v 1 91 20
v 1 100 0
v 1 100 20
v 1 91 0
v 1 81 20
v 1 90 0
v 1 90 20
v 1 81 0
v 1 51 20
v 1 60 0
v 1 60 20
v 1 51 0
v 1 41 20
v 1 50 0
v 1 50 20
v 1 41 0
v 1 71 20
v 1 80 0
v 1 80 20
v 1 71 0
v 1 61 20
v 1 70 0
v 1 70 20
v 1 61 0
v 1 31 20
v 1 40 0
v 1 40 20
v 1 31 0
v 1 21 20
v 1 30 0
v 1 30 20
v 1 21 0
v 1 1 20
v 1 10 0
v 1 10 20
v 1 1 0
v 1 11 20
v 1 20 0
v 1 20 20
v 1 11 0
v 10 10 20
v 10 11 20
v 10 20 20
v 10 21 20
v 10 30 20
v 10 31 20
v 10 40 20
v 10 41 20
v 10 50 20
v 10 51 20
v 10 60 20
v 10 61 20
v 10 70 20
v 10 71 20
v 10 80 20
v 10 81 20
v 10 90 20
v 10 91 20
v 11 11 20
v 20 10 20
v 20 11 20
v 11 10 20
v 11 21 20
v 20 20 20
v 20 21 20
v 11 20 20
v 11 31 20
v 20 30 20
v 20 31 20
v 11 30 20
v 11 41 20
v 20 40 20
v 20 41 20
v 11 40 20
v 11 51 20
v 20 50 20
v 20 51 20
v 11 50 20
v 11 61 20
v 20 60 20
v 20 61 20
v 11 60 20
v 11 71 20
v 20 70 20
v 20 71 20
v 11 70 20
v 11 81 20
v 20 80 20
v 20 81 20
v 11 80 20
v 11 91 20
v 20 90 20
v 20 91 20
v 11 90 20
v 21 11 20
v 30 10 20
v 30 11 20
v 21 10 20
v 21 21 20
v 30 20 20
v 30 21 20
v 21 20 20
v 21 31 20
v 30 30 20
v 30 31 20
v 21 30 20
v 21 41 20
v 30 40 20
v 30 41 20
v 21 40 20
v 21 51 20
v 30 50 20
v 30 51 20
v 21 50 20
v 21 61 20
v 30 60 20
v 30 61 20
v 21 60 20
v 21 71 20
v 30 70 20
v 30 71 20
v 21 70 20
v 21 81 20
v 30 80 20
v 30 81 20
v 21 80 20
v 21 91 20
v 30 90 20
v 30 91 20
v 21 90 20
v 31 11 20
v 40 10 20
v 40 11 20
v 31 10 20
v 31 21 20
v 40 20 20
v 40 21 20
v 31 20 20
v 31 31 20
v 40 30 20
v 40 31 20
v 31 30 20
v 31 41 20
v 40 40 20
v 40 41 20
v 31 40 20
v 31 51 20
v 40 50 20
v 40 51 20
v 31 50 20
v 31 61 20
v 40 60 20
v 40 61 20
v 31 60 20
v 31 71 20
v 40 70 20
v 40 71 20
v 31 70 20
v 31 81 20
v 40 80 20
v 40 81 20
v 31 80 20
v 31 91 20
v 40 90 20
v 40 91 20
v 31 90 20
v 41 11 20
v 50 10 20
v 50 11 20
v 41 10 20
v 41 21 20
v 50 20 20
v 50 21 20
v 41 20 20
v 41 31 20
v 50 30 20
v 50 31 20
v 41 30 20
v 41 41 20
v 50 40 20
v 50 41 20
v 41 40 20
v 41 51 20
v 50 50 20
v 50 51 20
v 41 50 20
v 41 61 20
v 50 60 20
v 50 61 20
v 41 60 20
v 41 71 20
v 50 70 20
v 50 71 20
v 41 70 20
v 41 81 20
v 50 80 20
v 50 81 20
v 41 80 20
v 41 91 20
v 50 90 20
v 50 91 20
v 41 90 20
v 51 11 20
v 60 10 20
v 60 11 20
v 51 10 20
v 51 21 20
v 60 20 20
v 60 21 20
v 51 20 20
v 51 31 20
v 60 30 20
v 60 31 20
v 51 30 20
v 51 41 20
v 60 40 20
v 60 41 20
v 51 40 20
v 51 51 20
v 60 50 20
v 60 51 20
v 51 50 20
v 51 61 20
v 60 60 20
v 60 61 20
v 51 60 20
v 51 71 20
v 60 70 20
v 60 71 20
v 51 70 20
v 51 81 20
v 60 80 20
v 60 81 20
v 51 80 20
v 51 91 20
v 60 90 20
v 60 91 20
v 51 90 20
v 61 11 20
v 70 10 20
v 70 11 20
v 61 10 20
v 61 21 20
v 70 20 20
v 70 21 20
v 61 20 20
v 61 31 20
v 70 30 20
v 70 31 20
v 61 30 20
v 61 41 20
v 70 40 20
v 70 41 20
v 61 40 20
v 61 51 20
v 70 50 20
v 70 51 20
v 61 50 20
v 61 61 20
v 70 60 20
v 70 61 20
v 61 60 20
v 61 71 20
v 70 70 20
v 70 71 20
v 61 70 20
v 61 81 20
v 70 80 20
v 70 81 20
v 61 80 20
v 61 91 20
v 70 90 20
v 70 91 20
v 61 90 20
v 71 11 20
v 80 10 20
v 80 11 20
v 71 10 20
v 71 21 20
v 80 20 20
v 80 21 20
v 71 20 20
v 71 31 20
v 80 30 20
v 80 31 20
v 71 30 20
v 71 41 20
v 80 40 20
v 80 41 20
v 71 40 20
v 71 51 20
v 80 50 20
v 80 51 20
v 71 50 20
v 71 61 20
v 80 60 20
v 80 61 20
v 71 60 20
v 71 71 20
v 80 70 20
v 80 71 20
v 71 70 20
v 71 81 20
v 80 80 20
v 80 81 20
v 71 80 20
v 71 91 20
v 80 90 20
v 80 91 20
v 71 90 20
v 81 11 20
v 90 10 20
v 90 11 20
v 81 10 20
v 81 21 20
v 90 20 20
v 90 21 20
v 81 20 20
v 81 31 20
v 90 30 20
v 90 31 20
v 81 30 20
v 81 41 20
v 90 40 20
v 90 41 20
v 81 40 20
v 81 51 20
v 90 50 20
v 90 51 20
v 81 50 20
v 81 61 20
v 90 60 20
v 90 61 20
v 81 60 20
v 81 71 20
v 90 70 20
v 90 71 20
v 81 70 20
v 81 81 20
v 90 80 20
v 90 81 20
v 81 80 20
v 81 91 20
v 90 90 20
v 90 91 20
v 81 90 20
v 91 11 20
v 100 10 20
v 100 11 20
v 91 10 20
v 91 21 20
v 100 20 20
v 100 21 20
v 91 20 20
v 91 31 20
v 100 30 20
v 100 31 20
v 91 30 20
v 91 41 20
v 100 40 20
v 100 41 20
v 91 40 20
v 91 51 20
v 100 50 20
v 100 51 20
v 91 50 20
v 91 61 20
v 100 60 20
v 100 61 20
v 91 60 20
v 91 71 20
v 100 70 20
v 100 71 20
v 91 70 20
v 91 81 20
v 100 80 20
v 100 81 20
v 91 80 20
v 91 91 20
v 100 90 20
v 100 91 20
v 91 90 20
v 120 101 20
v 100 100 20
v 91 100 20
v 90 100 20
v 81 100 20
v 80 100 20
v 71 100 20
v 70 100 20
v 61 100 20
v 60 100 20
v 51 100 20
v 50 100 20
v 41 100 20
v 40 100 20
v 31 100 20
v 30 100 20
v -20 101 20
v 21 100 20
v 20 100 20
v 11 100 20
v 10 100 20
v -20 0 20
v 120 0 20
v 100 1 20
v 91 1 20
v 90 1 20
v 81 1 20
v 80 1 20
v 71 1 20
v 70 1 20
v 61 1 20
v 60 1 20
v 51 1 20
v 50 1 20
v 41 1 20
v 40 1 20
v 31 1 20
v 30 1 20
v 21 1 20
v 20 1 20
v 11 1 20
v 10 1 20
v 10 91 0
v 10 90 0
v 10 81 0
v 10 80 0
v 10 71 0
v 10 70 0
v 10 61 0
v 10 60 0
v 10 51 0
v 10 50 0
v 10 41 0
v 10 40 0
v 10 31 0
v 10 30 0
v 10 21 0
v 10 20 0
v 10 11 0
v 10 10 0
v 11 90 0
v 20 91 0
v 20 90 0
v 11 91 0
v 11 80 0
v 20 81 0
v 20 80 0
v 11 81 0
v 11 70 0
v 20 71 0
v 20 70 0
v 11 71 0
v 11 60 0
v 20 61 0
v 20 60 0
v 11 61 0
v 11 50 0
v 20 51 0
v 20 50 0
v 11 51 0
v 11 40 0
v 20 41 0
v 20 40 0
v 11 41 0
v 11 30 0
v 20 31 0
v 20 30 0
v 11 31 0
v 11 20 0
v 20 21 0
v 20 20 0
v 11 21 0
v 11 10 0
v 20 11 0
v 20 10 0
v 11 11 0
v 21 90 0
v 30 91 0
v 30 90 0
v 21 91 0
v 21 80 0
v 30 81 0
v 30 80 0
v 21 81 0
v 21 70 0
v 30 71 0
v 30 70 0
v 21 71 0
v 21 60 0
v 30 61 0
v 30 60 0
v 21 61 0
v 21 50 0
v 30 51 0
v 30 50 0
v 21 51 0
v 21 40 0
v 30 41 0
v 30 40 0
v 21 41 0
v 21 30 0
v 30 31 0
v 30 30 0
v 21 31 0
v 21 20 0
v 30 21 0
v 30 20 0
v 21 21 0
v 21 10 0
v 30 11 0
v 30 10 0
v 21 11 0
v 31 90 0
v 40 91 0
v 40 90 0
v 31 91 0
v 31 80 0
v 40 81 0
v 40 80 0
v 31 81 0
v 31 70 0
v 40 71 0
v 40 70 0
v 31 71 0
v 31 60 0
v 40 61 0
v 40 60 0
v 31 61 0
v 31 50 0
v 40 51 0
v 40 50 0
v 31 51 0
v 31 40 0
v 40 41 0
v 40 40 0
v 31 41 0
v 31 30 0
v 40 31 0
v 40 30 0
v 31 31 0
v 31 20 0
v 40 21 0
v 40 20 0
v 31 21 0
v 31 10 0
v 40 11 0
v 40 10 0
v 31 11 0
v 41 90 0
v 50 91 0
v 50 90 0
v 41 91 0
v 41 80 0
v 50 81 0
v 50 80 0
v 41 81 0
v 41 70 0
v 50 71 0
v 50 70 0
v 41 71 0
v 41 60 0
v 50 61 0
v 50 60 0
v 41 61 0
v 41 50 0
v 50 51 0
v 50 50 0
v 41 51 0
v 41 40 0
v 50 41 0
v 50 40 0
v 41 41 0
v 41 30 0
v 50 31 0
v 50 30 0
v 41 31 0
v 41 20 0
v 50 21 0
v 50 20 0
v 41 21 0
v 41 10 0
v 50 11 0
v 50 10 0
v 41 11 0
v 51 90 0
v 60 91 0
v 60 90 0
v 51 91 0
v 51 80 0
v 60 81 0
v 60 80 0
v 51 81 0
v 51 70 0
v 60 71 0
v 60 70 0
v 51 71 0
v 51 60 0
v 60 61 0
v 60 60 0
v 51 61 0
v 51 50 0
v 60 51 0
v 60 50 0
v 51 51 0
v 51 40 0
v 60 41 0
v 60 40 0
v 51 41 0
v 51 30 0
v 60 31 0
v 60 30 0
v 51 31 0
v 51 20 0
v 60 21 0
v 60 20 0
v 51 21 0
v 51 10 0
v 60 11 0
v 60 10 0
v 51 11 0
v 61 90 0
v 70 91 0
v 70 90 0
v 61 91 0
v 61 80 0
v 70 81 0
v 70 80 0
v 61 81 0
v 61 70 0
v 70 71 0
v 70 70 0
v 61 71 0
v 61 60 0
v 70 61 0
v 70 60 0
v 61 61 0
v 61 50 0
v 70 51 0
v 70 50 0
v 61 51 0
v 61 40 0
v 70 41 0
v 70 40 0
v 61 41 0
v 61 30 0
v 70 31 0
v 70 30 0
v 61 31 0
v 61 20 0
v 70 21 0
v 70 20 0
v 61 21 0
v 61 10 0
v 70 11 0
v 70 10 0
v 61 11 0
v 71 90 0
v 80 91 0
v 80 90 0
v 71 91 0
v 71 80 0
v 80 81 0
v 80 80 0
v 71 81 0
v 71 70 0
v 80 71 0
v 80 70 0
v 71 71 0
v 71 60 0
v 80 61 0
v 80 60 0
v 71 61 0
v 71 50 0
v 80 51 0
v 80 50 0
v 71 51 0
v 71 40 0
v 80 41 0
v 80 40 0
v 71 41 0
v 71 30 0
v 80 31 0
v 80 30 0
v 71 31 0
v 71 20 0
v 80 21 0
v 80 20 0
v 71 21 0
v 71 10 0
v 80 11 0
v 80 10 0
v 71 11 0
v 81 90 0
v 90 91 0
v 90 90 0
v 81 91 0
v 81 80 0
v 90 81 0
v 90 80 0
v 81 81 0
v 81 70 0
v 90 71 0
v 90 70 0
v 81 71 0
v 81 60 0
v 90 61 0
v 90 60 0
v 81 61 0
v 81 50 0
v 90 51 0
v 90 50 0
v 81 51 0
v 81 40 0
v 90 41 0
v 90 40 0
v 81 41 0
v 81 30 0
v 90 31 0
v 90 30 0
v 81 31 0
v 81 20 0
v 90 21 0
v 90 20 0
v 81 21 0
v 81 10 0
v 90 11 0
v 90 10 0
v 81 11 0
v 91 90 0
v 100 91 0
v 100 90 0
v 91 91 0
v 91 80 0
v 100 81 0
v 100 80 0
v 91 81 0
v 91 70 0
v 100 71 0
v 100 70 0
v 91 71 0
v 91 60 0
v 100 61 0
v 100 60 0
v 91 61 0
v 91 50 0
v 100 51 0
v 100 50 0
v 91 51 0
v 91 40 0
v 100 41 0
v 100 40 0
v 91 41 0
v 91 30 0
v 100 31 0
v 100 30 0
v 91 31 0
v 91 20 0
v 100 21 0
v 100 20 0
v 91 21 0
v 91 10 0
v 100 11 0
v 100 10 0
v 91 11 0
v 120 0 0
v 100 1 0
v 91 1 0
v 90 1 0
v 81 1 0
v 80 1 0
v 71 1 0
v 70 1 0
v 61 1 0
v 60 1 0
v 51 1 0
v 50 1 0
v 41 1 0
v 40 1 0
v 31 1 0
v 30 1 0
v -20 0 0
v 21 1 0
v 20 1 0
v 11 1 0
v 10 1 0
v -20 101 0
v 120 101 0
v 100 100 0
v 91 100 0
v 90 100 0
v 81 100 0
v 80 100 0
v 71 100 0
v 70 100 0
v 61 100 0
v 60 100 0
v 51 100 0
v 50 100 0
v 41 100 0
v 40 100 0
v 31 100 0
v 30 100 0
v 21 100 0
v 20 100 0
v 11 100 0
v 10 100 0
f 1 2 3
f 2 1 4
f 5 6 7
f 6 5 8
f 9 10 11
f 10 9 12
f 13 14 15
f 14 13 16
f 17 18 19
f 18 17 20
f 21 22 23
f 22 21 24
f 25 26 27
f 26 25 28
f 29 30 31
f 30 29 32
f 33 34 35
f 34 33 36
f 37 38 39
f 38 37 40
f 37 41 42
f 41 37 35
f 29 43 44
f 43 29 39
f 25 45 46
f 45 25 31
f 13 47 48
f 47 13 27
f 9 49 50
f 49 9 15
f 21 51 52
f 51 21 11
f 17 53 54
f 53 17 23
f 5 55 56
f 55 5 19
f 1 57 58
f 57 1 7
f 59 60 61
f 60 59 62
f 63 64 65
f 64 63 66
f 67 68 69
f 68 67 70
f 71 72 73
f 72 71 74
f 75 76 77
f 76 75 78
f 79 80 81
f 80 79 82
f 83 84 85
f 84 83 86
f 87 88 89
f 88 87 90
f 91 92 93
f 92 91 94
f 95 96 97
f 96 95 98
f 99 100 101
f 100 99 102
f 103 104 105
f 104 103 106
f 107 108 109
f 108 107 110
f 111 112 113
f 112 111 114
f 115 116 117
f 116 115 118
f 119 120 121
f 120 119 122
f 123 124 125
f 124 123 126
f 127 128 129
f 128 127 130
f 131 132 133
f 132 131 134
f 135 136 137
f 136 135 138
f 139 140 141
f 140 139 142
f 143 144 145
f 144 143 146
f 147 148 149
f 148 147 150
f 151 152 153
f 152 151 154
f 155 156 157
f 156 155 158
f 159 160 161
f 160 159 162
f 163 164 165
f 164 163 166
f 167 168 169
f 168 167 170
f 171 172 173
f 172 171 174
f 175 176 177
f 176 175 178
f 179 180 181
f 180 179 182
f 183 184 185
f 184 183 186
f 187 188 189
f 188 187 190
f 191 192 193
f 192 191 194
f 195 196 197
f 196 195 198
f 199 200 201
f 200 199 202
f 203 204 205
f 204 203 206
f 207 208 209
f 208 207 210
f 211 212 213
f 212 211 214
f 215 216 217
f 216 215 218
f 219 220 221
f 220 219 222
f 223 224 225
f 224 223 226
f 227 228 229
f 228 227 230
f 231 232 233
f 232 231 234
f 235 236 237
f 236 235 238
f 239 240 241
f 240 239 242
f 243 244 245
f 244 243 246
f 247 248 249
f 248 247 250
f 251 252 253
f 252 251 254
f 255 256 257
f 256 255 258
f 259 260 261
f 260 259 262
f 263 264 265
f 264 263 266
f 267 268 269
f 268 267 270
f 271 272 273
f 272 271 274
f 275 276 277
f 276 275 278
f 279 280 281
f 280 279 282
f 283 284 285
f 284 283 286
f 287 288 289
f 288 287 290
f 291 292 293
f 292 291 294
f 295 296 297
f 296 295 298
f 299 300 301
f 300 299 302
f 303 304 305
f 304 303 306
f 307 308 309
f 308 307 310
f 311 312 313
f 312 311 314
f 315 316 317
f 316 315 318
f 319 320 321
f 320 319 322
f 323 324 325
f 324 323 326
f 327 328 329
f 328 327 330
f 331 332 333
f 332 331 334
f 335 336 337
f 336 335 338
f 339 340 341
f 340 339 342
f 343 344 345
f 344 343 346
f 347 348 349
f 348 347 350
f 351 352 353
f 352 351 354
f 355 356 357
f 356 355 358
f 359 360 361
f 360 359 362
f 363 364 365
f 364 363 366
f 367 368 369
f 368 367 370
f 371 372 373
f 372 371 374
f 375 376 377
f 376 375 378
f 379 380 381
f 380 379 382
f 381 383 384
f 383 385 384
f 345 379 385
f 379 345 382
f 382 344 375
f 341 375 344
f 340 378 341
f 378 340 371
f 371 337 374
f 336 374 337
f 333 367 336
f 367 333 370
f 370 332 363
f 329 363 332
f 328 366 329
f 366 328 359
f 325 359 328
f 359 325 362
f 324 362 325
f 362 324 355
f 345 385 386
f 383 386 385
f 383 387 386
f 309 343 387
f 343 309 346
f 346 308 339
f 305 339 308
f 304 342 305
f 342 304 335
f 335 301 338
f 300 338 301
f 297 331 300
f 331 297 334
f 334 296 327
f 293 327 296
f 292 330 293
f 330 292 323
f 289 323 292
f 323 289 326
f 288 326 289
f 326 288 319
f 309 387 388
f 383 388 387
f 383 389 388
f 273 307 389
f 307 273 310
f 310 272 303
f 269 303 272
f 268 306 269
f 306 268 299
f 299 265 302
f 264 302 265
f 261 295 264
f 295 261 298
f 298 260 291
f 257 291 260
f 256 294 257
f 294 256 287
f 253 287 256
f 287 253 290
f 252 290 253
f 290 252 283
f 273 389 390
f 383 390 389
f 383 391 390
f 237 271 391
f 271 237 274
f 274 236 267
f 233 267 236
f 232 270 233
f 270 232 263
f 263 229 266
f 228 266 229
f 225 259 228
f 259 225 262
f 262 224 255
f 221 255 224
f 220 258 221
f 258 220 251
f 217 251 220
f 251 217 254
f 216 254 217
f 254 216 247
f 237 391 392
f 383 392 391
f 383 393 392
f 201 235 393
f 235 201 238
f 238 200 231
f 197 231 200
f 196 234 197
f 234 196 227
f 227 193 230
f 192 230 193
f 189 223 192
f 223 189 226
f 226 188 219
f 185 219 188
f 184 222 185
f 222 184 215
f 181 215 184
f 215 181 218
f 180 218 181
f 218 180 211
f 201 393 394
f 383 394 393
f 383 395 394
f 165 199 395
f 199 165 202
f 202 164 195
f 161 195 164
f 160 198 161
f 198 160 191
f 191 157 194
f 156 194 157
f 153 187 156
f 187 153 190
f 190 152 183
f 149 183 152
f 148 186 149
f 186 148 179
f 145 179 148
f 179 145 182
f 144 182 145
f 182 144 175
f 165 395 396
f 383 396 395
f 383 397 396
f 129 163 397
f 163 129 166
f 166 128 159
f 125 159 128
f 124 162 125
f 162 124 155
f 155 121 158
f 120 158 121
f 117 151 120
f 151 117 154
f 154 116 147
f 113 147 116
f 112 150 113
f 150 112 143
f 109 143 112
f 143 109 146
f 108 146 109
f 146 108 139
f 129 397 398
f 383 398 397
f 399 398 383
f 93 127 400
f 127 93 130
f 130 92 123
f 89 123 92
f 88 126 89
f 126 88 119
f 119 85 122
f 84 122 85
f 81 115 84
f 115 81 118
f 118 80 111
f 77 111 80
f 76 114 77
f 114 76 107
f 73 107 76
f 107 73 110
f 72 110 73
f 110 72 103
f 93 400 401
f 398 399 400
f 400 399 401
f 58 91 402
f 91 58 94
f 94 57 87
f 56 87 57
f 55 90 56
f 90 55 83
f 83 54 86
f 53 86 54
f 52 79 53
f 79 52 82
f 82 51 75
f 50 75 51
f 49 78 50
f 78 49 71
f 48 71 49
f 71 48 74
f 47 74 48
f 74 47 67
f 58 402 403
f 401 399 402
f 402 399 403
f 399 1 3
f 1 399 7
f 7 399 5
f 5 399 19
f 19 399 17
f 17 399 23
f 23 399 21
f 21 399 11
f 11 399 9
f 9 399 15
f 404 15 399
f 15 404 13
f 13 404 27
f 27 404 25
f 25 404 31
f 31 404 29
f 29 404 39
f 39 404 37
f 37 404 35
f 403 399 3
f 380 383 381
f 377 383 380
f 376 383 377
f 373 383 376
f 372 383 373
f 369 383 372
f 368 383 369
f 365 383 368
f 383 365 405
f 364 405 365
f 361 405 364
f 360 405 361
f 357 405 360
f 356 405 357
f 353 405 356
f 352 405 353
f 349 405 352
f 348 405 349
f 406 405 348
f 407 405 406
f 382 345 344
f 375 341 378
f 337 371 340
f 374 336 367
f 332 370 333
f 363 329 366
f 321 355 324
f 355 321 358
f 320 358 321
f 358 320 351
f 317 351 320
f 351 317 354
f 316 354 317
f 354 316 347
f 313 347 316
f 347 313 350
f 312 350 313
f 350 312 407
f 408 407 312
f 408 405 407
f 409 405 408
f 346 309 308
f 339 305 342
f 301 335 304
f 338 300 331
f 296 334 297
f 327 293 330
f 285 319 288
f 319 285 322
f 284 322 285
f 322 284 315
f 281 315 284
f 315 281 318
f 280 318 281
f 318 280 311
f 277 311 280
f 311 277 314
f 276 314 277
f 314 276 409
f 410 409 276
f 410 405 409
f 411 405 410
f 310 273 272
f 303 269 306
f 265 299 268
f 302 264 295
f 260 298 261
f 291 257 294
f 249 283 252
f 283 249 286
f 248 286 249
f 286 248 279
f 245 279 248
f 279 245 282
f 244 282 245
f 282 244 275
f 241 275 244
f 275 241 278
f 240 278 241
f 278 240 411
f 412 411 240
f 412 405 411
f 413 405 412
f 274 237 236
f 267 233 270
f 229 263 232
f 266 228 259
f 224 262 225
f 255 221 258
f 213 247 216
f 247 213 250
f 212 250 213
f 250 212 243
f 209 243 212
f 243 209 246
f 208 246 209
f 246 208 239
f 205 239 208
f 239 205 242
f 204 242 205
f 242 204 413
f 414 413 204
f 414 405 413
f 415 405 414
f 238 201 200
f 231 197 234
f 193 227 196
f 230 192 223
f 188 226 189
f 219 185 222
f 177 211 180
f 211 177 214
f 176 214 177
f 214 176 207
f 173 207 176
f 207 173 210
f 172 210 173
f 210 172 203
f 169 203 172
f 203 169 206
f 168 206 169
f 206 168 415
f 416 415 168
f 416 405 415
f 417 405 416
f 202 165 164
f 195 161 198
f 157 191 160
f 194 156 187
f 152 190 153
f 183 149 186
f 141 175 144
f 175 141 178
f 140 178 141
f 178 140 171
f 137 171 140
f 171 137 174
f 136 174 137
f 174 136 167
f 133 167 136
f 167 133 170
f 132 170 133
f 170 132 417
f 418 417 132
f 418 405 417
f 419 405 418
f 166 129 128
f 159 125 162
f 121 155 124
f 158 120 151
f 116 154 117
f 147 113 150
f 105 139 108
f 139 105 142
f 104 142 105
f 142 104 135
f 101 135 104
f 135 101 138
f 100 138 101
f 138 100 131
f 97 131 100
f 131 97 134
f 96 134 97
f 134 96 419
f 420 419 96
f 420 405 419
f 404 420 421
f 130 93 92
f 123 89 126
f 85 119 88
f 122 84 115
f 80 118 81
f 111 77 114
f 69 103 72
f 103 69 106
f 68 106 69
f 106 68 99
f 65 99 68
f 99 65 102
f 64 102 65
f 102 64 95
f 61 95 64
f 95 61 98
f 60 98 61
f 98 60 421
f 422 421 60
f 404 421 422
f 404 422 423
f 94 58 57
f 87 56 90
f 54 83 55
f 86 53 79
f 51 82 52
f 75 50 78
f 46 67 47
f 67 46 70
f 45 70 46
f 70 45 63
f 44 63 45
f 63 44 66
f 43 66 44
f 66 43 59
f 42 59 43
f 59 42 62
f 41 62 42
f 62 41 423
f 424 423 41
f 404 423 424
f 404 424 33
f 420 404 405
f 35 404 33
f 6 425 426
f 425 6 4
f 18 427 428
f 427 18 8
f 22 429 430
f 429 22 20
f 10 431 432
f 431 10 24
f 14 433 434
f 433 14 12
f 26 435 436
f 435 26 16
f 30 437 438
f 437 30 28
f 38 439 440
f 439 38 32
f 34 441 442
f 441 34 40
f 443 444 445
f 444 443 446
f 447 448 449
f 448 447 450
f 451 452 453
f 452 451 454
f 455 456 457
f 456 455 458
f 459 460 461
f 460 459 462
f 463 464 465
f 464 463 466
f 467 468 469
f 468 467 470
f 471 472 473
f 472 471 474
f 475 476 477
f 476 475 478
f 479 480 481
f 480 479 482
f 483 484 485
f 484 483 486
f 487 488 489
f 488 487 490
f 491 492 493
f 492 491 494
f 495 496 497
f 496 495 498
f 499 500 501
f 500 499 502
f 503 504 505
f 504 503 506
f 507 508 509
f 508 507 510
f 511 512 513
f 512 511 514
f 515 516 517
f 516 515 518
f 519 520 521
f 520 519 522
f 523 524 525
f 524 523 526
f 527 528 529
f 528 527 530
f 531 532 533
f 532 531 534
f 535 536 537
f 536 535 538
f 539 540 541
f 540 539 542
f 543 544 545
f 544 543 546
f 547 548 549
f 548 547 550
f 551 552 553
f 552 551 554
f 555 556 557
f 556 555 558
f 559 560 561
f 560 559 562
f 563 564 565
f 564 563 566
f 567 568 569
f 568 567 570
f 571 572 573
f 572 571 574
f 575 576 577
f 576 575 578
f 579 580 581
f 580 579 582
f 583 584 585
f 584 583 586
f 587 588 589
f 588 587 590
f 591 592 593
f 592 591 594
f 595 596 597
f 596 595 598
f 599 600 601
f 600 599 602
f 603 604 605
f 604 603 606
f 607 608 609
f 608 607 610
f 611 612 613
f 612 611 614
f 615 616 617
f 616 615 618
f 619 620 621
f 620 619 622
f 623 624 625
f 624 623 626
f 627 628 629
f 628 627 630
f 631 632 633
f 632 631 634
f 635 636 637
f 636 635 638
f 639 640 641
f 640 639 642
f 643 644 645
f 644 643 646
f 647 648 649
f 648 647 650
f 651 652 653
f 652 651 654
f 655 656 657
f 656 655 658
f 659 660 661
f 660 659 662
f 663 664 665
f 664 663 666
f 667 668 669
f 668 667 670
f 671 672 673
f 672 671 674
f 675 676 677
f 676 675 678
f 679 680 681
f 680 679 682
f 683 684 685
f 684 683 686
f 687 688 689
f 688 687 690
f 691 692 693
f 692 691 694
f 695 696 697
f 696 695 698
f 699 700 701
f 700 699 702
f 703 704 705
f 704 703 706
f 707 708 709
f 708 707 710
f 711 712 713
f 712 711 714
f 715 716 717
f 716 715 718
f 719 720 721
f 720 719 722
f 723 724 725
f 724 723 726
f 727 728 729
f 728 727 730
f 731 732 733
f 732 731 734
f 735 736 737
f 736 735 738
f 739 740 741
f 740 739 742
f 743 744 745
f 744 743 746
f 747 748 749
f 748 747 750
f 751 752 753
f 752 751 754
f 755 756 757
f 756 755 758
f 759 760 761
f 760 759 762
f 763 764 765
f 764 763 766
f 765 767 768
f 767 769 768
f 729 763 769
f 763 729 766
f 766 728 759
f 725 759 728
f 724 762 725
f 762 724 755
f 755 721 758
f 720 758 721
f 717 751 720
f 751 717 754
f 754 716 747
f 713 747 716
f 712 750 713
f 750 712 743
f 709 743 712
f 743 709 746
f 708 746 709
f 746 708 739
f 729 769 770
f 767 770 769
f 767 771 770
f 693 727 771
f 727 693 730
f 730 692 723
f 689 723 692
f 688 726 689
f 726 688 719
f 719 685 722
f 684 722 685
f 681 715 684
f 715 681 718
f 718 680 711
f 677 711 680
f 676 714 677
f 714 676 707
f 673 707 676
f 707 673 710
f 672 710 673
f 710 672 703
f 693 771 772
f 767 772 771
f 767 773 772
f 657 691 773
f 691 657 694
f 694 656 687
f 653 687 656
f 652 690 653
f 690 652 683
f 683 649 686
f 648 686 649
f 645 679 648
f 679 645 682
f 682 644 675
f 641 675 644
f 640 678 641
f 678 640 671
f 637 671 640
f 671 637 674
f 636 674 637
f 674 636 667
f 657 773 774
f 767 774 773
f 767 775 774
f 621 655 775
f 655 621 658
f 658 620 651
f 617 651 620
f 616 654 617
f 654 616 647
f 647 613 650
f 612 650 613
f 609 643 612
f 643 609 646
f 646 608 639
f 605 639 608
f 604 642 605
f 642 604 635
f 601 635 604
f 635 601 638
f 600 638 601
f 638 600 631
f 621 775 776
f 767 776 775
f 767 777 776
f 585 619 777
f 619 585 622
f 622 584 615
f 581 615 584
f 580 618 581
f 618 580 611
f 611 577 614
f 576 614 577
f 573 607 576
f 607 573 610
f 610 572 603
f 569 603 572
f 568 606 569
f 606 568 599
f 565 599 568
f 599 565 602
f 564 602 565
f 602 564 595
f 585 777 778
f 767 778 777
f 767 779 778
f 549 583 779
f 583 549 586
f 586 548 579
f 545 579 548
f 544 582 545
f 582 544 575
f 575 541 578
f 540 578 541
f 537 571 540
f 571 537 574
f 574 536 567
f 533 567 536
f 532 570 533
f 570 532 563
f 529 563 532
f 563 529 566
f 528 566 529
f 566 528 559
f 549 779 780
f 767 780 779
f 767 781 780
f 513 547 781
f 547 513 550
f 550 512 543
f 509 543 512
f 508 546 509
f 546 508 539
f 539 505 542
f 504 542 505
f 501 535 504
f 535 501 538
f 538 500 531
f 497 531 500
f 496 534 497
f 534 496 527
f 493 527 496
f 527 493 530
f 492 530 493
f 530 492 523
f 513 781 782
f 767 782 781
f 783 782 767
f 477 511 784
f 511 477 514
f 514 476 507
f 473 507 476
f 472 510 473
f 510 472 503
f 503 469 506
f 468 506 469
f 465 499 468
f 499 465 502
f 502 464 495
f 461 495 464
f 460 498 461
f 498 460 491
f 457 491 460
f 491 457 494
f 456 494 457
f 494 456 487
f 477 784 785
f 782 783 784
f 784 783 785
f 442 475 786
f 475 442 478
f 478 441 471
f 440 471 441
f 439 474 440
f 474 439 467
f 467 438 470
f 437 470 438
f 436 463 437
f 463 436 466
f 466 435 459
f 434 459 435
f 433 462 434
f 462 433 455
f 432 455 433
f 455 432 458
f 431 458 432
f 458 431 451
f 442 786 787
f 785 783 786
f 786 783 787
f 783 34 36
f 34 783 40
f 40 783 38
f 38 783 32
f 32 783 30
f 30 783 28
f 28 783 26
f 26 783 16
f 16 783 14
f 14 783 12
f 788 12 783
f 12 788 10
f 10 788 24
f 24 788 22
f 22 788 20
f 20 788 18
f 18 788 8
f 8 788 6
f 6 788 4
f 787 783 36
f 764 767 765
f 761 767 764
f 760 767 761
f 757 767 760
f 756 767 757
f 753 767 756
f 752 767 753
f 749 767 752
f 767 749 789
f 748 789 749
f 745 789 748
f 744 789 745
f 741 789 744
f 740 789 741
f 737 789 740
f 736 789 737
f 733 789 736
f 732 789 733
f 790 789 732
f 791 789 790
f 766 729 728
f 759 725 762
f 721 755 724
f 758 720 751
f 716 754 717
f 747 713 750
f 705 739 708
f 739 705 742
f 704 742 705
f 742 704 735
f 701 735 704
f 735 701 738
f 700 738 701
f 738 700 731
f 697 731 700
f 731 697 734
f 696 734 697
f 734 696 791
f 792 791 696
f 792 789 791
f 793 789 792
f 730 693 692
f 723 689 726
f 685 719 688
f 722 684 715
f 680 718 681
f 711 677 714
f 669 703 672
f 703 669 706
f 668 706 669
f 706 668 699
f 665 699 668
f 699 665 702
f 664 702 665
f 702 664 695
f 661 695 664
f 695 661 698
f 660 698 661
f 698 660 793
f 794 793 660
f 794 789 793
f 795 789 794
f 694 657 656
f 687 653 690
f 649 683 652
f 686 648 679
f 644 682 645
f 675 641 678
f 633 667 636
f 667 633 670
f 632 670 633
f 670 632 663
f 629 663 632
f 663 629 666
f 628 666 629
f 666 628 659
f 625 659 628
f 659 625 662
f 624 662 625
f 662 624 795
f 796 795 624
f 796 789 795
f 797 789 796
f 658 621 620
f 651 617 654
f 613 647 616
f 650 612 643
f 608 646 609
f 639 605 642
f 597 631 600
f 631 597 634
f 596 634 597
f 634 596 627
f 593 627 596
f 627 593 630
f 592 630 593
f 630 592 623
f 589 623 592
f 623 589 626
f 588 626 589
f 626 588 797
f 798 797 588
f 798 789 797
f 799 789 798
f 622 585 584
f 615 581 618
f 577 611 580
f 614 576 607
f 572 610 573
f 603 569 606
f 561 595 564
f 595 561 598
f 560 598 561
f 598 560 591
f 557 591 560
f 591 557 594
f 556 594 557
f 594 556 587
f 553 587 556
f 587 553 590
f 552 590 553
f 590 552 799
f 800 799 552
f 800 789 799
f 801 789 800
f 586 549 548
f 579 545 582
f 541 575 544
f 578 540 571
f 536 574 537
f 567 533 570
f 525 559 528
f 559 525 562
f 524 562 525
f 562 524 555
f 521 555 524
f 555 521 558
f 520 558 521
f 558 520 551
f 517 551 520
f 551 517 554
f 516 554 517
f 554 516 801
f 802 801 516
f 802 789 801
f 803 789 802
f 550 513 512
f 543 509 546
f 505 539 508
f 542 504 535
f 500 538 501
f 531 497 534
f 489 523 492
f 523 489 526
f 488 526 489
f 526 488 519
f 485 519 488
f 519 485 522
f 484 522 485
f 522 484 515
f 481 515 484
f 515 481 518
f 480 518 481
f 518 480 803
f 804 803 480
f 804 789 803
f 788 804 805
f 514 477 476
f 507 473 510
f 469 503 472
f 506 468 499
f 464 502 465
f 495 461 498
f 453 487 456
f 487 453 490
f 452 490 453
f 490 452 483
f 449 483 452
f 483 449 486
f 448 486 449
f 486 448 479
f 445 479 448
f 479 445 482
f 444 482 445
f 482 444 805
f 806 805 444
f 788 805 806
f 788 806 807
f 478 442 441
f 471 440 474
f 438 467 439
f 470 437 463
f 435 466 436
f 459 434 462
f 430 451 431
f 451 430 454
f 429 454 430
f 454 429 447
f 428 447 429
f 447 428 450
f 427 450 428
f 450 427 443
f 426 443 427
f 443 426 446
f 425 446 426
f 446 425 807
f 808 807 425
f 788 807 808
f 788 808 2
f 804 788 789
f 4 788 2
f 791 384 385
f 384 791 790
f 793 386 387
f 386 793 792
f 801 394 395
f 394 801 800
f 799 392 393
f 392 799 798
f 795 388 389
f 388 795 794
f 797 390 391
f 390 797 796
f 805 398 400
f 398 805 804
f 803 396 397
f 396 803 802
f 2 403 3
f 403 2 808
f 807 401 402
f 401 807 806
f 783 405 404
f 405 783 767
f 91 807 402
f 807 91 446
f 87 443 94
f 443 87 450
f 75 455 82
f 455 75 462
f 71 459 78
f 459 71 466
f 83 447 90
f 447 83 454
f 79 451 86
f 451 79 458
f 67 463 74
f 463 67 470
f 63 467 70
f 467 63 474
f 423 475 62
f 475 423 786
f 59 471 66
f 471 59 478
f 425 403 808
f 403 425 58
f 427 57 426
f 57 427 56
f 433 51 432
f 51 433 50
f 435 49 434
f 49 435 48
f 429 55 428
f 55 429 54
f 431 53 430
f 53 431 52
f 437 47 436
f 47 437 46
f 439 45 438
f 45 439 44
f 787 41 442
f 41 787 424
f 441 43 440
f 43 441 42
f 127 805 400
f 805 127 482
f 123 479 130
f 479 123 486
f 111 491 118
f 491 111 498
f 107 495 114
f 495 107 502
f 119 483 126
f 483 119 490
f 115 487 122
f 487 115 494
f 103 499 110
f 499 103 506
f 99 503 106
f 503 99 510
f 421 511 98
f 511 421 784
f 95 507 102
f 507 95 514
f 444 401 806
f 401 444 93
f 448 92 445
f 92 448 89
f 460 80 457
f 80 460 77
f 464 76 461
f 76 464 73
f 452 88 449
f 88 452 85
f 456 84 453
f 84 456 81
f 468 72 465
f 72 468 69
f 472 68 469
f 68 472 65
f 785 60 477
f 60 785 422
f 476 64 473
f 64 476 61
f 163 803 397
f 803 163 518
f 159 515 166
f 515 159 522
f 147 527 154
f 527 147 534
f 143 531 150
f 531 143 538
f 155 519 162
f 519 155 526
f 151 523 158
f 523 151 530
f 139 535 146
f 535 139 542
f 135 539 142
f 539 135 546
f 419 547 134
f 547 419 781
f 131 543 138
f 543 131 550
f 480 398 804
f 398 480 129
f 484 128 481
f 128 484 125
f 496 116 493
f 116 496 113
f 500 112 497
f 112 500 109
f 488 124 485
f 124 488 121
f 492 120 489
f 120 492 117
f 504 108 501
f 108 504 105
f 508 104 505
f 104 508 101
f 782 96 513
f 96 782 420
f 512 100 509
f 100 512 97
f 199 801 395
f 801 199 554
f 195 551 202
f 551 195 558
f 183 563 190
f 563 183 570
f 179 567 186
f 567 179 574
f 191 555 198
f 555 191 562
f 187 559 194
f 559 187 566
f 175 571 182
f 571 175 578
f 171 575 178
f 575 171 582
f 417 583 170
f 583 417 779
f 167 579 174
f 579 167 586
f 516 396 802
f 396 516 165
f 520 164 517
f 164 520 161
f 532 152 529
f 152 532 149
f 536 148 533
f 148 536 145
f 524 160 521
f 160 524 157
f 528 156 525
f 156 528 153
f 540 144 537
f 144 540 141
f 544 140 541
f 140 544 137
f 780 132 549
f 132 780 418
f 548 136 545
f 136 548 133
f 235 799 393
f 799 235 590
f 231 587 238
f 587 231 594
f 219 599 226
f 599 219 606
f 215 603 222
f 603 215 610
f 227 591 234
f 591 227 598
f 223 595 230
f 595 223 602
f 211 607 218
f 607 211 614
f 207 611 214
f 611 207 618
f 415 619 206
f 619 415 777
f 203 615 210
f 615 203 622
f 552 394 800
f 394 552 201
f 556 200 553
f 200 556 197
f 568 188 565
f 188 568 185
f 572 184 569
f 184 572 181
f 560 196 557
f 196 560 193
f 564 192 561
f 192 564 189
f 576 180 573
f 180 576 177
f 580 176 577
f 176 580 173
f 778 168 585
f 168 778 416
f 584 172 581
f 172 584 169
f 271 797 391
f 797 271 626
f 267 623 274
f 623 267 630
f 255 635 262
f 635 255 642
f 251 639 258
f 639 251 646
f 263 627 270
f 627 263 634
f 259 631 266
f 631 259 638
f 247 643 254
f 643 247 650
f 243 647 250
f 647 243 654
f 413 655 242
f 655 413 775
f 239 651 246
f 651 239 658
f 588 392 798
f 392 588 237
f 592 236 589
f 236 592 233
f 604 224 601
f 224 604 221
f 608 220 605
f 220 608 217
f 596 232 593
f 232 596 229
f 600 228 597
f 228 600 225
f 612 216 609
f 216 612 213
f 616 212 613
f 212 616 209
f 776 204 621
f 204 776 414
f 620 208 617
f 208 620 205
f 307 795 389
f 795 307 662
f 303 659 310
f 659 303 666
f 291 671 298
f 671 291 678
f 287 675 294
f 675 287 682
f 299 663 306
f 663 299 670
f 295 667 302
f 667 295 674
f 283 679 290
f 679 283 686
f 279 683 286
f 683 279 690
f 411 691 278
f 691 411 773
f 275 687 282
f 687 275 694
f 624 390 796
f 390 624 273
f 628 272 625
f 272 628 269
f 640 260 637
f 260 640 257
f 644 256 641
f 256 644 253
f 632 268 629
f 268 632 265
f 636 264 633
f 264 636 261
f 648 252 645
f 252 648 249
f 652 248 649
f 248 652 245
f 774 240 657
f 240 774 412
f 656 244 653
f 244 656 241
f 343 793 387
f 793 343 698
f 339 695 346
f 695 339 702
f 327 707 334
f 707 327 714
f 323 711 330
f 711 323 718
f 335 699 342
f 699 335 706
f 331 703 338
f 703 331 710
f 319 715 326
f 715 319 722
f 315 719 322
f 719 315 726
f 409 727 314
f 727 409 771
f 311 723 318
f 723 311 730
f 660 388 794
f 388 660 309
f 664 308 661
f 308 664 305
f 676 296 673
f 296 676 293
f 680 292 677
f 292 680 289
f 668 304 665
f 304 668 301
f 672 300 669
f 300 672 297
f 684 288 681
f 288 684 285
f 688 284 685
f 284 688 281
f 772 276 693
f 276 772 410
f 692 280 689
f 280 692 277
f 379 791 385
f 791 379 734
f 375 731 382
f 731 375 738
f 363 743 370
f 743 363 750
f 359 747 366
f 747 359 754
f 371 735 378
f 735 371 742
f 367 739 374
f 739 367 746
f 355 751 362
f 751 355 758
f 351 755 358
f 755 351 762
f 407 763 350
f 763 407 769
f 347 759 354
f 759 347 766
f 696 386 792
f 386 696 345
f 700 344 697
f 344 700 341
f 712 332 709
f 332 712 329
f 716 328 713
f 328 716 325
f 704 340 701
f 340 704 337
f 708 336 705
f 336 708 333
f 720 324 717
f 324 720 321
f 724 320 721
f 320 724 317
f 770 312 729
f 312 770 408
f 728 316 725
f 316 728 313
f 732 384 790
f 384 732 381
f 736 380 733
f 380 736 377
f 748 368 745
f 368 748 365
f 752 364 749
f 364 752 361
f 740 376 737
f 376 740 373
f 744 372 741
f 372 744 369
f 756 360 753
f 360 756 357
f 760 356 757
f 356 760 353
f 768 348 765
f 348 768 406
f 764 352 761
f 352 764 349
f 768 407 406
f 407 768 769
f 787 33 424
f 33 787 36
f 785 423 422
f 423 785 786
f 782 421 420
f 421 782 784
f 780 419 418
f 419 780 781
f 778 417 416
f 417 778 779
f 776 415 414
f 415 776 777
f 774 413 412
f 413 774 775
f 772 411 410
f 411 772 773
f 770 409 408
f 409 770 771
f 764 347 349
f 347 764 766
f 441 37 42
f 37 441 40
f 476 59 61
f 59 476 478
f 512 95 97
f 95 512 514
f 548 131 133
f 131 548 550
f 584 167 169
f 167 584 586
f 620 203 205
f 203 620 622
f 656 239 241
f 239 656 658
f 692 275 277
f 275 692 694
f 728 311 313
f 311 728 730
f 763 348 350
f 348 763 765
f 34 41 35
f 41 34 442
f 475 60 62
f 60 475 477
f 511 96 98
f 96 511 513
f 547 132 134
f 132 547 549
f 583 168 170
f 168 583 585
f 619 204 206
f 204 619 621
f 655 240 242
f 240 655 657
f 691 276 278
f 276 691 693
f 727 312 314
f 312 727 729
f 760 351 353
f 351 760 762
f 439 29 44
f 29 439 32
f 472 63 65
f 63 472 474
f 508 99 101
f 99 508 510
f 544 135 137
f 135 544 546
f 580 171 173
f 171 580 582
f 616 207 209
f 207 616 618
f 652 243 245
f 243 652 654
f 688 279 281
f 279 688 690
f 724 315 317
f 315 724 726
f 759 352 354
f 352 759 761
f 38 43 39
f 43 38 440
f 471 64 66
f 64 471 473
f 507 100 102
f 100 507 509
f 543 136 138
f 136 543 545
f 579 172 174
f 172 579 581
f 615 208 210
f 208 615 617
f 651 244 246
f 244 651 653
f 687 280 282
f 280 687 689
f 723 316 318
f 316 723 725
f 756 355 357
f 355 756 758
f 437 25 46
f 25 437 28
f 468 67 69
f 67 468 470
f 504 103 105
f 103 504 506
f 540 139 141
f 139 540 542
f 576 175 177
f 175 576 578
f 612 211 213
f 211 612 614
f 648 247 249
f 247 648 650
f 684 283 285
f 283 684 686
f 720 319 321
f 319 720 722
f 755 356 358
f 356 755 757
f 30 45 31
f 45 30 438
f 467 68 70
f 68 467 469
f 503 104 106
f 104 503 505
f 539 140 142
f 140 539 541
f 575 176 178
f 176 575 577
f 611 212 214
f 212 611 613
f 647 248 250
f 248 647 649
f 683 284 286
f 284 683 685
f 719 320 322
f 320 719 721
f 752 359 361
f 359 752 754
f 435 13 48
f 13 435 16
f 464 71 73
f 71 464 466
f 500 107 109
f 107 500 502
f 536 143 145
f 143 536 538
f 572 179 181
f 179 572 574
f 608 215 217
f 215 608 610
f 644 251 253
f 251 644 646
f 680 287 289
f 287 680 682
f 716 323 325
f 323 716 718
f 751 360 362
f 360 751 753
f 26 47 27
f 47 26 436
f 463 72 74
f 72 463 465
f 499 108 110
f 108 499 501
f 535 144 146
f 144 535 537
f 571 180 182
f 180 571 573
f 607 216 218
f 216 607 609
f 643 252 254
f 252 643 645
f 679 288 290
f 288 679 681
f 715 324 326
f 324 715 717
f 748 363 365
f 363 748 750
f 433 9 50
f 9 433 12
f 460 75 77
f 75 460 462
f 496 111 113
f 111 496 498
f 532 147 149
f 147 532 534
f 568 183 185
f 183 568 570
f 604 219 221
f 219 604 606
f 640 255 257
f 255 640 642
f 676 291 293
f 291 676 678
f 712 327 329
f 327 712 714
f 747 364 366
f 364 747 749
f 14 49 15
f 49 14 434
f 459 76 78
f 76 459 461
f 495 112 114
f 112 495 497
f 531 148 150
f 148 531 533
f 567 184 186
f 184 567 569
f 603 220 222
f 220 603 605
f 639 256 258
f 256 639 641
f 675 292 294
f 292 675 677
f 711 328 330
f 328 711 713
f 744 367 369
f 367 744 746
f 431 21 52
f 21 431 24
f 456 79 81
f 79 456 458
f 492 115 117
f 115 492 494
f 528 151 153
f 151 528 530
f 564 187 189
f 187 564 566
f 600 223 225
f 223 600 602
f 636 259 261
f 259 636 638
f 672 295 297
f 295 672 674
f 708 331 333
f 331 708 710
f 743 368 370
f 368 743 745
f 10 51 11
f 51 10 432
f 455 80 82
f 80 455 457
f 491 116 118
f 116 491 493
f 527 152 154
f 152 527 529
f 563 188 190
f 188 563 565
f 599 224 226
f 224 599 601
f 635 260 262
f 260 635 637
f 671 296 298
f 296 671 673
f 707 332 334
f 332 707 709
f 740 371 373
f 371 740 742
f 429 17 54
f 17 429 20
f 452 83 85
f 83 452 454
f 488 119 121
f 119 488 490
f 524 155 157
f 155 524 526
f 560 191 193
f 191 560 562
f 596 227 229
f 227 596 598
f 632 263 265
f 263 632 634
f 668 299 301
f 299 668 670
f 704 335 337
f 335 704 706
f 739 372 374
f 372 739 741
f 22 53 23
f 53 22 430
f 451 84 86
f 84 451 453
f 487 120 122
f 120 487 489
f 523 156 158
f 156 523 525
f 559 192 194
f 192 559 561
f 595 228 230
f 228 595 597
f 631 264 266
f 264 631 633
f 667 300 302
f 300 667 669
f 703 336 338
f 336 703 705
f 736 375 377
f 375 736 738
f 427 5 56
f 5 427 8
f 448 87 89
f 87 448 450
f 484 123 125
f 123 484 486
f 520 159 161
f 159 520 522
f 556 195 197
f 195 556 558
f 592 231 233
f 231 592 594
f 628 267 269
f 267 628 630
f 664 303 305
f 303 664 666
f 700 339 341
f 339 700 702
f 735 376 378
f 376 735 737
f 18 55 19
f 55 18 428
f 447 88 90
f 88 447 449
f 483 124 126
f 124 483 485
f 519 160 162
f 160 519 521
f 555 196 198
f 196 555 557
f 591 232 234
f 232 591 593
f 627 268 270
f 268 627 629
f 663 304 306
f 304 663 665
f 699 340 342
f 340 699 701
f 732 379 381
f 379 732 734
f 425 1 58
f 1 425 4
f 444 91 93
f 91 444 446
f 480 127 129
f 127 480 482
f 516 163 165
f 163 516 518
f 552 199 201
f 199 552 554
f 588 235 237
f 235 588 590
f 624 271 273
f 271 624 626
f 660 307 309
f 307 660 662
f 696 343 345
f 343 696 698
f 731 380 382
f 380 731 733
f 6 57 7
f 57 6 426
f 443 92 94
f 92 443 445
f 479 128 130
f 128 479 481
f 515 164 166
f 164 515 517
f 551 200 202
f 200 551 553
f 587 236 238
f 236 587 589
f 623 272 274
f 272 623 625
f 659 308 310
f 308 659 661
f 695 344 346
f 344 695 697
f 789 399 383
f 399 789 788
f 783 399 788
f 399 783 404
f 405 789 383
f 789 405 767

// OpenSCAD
width = 100;
length = 100;
height = 20;

ff_width = 10;
thickness = 1;

numw = width / ff_width;
numl = length / ff_width;
for(w = [0:numw]) {
    translate([w*ff_width,0,0])cube([thickness,length,height]);
}

for(w = [0:numl]) {
    translate([0,w*ff_width,0])cube([length,thickness,height]);
}


translate([-20,0,0])cube([20,length+thickness,height]);
translate([length,0,0])cube([20,length+thickness,height]);
